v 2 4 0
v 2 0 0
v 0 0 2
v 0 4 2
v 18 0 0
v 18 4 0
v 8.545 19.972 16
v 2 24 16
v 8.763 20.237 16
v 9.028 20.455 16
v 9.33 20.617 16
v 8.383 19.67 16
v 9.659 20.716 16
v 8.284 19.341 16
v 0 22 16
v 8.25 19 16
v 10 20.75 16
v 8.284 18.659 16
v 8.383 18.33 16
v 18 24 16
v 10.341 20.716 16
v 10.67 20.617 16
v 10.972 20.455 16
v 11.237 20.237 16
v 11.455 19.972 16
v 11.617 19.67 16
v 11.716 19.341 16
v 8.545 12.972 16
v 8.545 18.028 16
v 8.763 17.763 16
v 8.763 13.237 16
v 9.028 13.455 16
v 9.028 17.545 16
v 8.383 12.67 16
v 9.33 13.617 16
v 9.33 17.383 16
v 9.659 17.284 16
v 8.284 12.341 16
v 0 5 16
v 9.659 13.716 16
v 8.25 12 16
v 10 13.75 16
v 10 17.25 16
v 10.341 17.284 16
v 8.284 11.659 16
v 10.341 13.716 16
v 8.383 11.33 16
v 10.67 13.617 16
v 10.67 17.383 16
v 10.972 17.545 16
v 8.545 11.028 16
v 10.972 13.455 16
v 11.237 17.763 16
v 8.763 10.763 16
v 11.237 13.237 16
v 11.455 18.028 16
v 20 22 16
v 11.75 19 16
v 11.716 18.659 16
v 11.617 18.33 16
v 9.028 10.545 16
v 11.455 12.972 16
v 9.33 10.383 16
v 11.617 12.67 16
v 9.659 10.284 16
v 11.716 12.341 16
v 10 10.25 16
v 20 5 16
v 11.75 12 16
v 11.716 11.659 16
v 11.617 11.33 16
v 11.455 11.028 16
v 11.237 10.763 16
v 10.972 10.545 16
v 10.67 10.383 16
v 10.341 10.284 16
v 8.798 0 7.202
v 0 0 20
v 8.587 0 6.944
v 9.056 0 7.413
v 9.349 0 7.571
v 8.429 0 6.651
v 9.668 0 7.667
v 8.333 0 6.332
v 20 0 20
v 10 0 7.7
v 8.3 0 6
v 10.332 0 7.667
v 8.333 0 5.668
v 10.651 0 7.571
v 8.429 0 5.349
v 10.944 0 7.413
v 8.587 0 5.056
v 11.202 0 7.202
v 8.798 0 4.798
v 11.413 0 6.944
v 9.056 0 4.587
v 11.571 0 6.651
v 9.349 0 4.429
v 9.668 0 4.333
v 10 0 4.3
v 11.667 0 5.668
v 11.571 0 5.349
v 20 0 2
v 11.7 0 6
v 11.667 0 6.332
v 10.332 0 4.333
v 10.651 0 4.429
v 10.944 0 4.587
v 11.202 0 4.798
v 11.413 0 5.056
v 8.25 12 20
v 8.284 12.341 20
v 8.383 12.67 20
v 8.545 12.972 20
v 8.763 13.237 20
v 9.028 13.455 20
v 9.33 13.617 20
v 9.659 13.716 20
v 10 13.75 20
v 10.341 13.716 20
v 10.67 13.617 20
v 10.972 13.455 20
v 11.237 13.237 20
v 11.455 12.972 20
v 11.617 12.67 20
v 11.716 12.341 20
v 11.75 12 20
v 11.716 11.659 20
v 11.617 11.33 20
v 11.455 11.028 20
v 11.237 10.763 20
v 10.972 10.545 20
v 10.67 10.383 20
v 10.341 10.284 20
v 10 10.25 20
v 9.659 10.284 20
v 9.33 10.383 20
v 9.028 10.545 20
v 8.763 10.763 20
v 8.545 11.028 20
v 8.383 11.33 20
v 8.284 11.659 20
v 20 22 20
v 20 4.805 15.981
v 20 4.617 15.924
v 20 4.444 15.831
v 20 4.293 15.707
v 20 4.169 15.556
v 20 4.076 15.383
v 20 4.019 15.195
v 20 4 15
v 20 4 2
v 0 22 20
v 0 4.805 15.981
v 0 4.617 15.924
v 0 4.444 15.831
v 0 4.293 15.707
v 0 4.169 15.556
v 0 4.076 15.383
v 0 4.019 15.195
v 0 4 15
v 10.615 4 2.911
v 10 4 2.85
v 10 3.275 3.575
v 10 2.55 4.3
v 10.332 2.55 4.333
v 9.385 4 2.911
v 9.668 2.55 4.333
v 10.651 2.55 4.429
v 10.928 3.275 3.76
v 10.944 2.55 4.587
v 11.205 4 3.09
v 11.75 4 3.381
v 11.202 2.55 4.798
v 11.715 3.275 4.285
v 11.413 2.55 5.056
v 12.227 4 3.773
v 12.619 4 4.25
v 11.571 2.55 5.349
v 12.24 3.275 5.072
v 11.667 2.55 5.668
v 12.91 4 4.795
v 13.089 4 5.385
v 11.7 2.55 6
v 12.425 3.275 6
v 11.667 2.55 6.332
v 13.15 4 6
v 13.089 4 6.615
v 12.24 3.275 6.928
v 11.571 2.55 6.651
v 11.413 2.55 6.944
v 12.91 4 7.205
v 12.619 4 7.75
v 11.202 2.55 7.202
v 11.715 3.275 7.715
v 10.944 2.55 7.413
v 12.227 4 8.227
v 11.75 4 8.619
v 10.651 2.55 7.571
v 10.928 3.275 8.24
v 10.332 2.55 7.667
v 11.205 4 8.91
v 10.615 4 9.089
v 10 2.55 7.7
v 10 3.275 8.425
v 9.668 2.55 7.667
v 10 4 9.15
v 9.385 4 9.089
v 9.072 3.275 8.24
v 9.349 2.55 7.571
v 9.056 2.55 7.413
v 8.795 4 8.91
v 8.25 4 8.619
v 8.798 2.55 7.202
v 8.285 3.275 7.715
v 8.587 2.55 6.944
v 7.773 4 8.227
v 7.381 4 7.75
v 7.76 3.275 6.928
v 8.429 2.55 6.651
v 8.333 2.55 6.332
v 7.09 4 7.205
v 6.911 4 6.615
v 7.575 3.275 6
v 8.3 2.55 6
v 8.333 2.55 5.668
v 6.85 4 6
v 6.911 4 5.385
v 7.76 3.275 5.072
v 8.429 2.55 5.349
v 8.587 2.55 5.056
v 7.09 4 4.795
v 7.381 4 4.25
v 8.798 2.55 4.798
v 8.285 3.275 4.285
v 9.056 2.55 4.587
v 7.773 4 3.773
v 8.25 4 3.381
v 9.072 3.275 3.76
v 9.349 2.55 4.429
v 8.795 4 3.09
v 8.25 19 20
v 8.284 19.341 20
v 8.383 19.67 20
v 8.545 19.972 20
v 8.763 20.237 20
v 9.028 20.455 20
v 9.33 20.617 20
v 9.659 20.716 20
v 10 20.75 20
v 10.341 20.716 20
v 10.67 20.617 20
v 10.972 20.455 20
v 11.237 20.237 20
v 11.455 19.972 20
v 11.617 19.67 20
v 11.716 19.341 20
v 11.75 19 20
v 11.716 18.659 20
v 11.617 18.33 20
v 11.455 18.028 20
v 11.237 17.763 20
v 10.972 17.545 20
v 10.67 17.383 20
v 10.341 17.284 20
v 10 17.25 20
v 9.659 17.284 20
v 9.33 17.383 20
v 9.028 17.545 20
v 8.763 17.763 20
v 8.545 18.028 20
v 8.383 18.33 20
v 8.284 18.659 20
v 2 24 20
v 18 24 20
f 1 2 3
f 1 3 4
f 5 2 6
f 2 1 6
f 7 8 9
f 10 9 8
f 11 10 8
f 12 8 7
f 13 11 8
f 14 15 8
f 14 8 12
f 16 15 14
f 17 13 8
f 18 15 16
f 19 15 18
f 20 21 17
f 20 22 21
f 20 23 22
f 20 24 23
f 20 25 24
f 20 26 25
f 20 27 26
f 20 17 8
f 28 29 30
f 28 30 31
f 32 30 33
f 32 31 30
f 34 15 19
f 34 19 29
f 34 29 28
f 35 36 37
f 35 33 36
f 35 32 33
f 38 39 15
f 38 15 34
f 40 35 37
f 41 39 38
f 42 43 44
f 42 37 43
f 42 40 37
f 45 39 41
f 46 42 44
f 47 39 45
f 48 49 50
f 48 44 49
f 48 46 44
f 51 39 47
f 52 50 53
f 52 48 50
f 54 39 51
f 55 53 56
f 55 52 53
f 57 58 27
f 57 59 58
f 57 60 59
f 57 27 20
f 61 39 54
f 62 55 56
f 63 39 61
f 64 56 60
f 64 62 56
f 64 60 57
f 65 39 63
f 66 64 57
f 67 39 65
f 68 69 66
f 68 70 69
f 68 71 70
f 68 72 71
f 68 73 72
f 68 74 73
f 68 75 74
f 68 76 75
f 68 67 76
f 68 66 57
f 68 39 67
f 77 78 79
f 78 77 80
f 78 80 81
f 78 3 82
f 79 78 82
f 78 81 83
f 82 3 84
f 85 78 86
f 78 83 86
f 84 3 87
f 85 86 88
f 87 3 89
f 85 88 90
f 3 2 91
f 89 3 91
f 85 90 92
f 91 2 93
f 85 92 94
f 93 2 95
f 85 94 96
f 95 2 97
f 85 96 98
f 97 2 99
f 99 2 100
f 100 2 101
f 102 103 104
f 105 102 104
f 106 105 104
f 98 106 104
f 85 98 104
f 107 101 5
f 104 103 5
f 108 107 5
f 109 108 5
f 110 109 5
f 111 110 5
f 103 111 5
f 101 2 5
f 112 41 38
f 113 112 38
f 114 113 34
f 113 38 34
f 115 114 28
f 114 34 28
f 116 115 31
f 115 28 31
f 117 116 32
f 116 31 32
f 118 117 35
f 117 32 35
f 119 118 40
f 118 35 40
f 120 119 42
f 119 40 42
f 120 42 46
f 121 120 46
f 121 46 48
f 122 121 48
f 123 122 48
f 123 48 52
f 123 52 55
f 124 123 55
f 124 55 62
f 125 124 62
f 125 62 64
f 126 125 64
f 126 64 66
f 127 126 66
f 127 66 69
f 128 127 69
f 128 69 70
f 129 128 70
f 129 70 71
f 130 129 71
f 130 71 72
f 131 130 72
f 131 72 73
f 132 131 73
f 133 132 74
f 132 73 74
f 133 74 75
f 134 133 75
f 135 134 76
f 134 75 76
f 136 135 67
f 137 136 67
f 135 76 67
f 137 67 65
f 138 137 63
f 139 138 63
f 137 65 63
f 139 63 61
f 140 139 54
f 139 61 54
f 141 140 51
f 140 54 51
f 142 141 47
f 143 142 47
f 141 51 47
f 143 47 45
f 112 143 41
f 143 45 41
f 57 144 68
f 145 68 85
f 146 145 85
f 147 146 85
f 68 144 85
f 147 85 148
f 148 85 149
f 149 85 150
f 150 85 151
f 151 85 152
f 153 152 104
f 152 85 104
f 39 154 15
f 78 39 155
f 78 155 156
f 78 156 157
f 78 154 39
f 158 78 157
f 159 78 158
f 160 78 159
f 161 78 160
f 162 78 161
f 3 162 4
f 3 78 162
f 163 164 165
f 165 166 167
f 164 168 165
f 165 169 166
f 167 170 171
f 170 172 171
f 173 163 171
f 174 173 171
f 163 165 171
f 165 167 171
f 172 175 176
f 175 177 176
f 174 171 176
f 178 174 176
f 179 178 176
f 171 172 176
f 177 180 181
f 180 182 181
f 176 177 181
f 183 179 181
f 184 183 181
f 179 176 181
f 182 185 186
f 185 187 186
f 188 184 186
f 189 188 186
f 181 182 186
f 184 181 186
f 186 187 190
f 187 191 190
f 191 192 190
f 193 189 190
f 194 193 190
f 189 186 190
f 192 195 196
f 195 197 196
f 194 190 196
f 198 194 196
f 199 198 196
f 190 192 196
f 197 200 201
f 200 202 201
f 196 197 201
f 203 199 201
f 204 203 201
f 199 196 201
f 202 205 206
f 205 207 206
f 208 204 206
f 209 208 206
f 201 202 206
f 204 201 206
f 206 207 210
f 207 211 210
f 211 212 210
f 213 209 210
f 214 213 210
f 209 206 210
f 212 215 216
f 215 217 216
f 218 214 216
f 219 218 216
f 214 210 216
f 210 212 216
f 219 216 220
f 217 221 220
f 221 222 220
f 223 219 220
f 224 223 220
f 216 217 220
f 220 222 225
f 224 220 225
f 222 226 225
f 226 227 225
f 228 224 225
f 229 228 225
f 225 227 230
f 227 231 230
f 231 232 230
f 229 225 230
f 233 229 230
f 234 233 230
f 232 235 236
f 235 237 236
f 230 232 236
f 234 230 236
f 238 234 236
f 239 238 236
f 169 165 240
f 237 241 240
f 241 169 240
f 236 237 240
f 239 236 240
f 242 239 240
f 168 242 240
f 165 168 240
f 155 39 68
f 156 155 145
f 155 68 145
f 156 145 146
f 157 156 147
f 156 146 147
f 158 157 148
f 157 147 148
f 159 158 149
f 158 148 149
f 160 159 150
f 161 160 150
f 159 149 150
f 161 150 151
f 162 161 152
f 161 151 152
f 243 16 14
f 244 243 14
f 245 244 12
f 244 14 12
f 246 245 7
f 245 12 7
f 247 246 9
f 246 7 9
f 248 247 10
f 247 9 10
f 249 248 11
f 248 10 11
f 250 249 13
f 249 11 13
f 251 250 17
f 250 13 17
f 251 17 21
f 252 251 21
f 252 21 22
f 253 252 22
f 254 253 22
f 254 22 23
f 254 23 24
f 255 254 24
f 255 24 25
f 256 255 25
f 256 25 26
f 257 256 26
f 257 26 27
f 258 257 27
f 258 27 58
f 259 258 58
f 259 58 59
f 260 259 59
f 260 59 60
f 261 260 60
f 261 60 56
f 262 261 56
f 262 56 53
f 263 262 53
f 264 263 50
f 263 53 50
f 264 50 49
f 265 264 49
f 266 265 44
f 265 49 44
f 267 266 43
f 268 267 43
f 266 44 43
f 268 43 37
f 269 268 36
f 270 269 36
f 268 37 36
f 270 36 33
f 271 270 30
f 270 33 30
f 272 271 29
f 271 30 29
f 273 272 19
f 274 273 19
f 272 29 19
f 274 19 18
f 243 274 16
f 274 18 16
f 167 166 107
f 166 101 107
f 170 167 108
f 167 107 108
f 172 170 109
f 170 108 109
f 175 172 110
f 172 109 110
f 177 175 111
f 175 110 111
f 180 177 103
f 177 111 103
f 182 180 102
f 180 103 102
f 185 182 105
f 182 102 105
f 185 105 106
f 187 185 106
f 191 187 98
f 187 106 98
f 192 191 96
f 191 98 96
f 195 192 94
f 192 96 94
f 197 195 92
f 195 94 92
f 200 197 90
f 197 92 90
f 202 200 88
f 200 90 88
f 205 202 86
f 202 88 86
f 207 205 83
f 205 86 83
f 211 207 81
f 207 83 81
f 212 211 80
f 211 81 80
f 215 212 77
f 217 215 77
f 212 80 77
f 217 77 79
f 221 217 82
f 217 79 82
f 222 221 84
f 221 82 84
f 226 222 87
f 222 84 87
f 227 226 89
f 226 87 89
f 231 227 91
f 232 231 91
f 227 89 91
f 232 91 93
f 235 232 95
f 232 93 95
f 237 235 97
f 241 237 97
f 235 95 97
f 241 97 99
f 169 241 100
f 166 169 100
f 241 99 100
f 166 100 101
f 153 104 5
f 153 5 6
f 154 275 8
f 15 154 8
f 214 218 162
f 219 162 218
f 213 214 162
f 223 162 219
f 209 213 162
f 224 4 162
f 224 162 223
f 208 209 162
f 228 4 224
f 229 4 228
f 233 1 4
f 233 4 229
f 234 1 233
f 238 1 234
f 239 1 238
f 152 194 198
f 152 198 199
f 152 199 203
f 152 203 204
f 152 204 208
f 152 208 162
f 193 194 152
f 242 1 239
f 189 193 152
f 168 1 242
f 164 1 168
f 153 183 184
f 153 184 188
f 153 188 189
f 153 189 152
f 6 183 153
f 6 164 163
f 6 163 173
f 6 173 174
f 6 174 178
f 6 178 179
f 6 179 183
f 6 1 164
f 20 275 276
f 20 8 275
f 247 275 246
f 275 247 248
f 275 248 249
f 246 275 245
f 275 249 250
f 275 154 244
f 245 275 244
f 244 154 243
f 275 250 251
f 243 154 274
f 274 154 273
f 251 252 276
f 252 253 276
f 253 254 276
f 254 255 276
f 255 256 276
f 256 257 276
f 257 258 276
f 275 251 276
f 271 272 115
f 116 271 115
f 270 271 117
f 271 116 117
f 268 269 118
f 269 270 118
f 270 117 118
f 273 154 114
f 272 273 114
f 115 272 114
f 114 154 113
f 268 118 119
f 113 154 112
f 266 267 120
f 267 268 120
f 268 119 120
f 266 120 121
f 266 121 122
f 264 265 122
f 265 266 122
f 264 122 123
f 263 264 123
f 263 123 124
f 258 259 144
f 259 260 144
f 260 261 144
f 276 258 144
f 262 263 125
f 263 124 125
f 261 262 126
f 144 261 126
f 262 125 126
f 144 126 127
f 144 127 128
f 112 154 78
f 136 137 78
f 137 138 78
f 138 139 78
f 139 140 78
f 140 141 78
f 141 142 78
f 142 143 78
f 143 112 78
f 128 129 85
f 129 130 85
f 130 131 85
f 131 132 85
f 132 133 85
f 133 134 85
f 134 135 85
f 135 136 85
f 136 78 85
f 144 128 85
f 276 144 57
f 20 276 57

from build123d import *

# Parameters (mm, degrees)
SCHIZZO1_W                                      = 20
SCHIZZO1_H                                      = 4
ESTRUSIONE_ESTRUSIONE1_DEPTH                    = 20
SCHIZZO2_W                                      = 20
SCHIZZO2_H                                      = 4
ESTRUSIONE_ESTRUSIONE2_DEPTH                    = 20
TAGLIO_ESTRUSIONE2_REACH                        = 6
SCHIZZO7_R                                      = 1.75
RACCORDO1_R                                     = 1
SMUSSO1_SIZE                                    = 2
SMUSSO3_SIZE                                    = 2
CSK_FOR_M3_OVAL_HEAD_MACHINE_SCREW1_D           = 3.4
CSK_FOR_M3_OVAL_HEAD_MACHINE_SCREW1_CSINK_D     = 6.3
CSK_FOR_M3_OVAL_HEAD_MACHINE_SCREW1_CSINK_ANGLE = 90


with BuildPart() as part:
    # Schizzo1 → Estrusione-Estrusione1 (new body)
    with BuildSketch(Plane.XY):
        with Locations((10, 2)):
            Rectangle(SCHIZZO1_W, SCHIZZO1_H)
    extrude(amount=ESTRUSIONE_ESTRUSIONE1_DEPTH)

    # Schizzo2 → Estrusione-Estrusione2 (add)
    with BuildSketch(Plane(origin=(0, 4, 0), x_dir=(1, 0, 0), z_dir=(0, 1, 0))):
        with Locations((10, -18)):
            Rectangle(SCHIZZO2_W, SCHIZZO2_H)
    extrude(amount=ESTRUSIONE_ESTRUSIONE2_DEPTH)

    # Schizzo7 → Taglio-Estrusione2 (cut, up to next)
    with BuildSketch(Plane(origin=(0, 0, 16), x_dir=(-1, 0, 0), z_dir=(0, 0, -1)), mode=Mode.PRIVATE) as taglio_estrusione2_sk1:
        with Locations((-10, 19)):
            Circle(SCHIZZO7_R)
    taglio_estrusione2_tool1 = extrude(taglio_estrusione2_sk1.sketch, amount=-TAGLIO_ESTRUSIONE2_REACH, mode=Mode.PRIVATE) & part.part
    add(taglio_estrusione2_tool1.solids().sort_by_distance((10, 19, 16))[0], mode=Mode.SUBTRACT)
    # Schizzo7 → Taglio-Estrusione2 (cut, up to next)
    with BuildSketch(Plane(origin=(0, 0, 16), x_dir=(-1, 0, 0), z_dir=(0, 0, -1)), mode=Mode.PRIVATE) as taglio_estrusione2_sk2:
        with Locations((-10, 12)):
            Circle(SCHIZZO7_R)
    taglio_estrusione2_tool2 = extrude(taglio_estrusione2_sk2.sketch, amount=-TAGLIO_ESTRUSIONE2_REACH, mode=Mode.PRIVATE) & part.part
    add(taglio_estrusione2_tool2.solids().sort_by_distance((10, 12, 16))[0], mode=Mode.SUBTRACT)

    # Raccordo1
    raccordo1_edges = [part.edges().sort_by_distance(p)[0] for p in [
        (10, 4, 16),
    ]]
    fillet(raccordo1_edges, radius=RACCORDO1_R)

    # Smusso1
    smusso1_edges = [part.edges().sort_by_distance(p)[0] for p in [
        (0, 24, 18),
        (20, 24, 18),
    ]]
    chamfer(smusso1_edges, length=SMUSSO1_SIZE)

    # Smusso3
    smusso3_edges = [part.edges().sort_by_distance(p)[0] for p in [
        (20, 2, 0),
        (0, 2, 0),
    ]]
    chamfer(smusso3_edges, length=SMUSSO3_SIZE)

    # CSK for M3 Oval Head Machine Screw1 (through all)
    with Locations(Plane(origin=(10, 4, 6), x_dir=(0, 0, 1), z_dir=(0, 1, 0))):
        with Locations((0, 0)):
            CounterSinkHole(CSK_FOR_M3_OVAL_HEAD_MACHINE_SCREW1_D / 2, CSK_FOR_M3_OVAL_HEAD_MACHINE_SCREW1_CSINK_D / 2, counter_sink_angle=CSK_FOR_M3_OVAL_HEAD_MACHINE_SCREW1_CSINK_ANGLE)


solid = part.part
